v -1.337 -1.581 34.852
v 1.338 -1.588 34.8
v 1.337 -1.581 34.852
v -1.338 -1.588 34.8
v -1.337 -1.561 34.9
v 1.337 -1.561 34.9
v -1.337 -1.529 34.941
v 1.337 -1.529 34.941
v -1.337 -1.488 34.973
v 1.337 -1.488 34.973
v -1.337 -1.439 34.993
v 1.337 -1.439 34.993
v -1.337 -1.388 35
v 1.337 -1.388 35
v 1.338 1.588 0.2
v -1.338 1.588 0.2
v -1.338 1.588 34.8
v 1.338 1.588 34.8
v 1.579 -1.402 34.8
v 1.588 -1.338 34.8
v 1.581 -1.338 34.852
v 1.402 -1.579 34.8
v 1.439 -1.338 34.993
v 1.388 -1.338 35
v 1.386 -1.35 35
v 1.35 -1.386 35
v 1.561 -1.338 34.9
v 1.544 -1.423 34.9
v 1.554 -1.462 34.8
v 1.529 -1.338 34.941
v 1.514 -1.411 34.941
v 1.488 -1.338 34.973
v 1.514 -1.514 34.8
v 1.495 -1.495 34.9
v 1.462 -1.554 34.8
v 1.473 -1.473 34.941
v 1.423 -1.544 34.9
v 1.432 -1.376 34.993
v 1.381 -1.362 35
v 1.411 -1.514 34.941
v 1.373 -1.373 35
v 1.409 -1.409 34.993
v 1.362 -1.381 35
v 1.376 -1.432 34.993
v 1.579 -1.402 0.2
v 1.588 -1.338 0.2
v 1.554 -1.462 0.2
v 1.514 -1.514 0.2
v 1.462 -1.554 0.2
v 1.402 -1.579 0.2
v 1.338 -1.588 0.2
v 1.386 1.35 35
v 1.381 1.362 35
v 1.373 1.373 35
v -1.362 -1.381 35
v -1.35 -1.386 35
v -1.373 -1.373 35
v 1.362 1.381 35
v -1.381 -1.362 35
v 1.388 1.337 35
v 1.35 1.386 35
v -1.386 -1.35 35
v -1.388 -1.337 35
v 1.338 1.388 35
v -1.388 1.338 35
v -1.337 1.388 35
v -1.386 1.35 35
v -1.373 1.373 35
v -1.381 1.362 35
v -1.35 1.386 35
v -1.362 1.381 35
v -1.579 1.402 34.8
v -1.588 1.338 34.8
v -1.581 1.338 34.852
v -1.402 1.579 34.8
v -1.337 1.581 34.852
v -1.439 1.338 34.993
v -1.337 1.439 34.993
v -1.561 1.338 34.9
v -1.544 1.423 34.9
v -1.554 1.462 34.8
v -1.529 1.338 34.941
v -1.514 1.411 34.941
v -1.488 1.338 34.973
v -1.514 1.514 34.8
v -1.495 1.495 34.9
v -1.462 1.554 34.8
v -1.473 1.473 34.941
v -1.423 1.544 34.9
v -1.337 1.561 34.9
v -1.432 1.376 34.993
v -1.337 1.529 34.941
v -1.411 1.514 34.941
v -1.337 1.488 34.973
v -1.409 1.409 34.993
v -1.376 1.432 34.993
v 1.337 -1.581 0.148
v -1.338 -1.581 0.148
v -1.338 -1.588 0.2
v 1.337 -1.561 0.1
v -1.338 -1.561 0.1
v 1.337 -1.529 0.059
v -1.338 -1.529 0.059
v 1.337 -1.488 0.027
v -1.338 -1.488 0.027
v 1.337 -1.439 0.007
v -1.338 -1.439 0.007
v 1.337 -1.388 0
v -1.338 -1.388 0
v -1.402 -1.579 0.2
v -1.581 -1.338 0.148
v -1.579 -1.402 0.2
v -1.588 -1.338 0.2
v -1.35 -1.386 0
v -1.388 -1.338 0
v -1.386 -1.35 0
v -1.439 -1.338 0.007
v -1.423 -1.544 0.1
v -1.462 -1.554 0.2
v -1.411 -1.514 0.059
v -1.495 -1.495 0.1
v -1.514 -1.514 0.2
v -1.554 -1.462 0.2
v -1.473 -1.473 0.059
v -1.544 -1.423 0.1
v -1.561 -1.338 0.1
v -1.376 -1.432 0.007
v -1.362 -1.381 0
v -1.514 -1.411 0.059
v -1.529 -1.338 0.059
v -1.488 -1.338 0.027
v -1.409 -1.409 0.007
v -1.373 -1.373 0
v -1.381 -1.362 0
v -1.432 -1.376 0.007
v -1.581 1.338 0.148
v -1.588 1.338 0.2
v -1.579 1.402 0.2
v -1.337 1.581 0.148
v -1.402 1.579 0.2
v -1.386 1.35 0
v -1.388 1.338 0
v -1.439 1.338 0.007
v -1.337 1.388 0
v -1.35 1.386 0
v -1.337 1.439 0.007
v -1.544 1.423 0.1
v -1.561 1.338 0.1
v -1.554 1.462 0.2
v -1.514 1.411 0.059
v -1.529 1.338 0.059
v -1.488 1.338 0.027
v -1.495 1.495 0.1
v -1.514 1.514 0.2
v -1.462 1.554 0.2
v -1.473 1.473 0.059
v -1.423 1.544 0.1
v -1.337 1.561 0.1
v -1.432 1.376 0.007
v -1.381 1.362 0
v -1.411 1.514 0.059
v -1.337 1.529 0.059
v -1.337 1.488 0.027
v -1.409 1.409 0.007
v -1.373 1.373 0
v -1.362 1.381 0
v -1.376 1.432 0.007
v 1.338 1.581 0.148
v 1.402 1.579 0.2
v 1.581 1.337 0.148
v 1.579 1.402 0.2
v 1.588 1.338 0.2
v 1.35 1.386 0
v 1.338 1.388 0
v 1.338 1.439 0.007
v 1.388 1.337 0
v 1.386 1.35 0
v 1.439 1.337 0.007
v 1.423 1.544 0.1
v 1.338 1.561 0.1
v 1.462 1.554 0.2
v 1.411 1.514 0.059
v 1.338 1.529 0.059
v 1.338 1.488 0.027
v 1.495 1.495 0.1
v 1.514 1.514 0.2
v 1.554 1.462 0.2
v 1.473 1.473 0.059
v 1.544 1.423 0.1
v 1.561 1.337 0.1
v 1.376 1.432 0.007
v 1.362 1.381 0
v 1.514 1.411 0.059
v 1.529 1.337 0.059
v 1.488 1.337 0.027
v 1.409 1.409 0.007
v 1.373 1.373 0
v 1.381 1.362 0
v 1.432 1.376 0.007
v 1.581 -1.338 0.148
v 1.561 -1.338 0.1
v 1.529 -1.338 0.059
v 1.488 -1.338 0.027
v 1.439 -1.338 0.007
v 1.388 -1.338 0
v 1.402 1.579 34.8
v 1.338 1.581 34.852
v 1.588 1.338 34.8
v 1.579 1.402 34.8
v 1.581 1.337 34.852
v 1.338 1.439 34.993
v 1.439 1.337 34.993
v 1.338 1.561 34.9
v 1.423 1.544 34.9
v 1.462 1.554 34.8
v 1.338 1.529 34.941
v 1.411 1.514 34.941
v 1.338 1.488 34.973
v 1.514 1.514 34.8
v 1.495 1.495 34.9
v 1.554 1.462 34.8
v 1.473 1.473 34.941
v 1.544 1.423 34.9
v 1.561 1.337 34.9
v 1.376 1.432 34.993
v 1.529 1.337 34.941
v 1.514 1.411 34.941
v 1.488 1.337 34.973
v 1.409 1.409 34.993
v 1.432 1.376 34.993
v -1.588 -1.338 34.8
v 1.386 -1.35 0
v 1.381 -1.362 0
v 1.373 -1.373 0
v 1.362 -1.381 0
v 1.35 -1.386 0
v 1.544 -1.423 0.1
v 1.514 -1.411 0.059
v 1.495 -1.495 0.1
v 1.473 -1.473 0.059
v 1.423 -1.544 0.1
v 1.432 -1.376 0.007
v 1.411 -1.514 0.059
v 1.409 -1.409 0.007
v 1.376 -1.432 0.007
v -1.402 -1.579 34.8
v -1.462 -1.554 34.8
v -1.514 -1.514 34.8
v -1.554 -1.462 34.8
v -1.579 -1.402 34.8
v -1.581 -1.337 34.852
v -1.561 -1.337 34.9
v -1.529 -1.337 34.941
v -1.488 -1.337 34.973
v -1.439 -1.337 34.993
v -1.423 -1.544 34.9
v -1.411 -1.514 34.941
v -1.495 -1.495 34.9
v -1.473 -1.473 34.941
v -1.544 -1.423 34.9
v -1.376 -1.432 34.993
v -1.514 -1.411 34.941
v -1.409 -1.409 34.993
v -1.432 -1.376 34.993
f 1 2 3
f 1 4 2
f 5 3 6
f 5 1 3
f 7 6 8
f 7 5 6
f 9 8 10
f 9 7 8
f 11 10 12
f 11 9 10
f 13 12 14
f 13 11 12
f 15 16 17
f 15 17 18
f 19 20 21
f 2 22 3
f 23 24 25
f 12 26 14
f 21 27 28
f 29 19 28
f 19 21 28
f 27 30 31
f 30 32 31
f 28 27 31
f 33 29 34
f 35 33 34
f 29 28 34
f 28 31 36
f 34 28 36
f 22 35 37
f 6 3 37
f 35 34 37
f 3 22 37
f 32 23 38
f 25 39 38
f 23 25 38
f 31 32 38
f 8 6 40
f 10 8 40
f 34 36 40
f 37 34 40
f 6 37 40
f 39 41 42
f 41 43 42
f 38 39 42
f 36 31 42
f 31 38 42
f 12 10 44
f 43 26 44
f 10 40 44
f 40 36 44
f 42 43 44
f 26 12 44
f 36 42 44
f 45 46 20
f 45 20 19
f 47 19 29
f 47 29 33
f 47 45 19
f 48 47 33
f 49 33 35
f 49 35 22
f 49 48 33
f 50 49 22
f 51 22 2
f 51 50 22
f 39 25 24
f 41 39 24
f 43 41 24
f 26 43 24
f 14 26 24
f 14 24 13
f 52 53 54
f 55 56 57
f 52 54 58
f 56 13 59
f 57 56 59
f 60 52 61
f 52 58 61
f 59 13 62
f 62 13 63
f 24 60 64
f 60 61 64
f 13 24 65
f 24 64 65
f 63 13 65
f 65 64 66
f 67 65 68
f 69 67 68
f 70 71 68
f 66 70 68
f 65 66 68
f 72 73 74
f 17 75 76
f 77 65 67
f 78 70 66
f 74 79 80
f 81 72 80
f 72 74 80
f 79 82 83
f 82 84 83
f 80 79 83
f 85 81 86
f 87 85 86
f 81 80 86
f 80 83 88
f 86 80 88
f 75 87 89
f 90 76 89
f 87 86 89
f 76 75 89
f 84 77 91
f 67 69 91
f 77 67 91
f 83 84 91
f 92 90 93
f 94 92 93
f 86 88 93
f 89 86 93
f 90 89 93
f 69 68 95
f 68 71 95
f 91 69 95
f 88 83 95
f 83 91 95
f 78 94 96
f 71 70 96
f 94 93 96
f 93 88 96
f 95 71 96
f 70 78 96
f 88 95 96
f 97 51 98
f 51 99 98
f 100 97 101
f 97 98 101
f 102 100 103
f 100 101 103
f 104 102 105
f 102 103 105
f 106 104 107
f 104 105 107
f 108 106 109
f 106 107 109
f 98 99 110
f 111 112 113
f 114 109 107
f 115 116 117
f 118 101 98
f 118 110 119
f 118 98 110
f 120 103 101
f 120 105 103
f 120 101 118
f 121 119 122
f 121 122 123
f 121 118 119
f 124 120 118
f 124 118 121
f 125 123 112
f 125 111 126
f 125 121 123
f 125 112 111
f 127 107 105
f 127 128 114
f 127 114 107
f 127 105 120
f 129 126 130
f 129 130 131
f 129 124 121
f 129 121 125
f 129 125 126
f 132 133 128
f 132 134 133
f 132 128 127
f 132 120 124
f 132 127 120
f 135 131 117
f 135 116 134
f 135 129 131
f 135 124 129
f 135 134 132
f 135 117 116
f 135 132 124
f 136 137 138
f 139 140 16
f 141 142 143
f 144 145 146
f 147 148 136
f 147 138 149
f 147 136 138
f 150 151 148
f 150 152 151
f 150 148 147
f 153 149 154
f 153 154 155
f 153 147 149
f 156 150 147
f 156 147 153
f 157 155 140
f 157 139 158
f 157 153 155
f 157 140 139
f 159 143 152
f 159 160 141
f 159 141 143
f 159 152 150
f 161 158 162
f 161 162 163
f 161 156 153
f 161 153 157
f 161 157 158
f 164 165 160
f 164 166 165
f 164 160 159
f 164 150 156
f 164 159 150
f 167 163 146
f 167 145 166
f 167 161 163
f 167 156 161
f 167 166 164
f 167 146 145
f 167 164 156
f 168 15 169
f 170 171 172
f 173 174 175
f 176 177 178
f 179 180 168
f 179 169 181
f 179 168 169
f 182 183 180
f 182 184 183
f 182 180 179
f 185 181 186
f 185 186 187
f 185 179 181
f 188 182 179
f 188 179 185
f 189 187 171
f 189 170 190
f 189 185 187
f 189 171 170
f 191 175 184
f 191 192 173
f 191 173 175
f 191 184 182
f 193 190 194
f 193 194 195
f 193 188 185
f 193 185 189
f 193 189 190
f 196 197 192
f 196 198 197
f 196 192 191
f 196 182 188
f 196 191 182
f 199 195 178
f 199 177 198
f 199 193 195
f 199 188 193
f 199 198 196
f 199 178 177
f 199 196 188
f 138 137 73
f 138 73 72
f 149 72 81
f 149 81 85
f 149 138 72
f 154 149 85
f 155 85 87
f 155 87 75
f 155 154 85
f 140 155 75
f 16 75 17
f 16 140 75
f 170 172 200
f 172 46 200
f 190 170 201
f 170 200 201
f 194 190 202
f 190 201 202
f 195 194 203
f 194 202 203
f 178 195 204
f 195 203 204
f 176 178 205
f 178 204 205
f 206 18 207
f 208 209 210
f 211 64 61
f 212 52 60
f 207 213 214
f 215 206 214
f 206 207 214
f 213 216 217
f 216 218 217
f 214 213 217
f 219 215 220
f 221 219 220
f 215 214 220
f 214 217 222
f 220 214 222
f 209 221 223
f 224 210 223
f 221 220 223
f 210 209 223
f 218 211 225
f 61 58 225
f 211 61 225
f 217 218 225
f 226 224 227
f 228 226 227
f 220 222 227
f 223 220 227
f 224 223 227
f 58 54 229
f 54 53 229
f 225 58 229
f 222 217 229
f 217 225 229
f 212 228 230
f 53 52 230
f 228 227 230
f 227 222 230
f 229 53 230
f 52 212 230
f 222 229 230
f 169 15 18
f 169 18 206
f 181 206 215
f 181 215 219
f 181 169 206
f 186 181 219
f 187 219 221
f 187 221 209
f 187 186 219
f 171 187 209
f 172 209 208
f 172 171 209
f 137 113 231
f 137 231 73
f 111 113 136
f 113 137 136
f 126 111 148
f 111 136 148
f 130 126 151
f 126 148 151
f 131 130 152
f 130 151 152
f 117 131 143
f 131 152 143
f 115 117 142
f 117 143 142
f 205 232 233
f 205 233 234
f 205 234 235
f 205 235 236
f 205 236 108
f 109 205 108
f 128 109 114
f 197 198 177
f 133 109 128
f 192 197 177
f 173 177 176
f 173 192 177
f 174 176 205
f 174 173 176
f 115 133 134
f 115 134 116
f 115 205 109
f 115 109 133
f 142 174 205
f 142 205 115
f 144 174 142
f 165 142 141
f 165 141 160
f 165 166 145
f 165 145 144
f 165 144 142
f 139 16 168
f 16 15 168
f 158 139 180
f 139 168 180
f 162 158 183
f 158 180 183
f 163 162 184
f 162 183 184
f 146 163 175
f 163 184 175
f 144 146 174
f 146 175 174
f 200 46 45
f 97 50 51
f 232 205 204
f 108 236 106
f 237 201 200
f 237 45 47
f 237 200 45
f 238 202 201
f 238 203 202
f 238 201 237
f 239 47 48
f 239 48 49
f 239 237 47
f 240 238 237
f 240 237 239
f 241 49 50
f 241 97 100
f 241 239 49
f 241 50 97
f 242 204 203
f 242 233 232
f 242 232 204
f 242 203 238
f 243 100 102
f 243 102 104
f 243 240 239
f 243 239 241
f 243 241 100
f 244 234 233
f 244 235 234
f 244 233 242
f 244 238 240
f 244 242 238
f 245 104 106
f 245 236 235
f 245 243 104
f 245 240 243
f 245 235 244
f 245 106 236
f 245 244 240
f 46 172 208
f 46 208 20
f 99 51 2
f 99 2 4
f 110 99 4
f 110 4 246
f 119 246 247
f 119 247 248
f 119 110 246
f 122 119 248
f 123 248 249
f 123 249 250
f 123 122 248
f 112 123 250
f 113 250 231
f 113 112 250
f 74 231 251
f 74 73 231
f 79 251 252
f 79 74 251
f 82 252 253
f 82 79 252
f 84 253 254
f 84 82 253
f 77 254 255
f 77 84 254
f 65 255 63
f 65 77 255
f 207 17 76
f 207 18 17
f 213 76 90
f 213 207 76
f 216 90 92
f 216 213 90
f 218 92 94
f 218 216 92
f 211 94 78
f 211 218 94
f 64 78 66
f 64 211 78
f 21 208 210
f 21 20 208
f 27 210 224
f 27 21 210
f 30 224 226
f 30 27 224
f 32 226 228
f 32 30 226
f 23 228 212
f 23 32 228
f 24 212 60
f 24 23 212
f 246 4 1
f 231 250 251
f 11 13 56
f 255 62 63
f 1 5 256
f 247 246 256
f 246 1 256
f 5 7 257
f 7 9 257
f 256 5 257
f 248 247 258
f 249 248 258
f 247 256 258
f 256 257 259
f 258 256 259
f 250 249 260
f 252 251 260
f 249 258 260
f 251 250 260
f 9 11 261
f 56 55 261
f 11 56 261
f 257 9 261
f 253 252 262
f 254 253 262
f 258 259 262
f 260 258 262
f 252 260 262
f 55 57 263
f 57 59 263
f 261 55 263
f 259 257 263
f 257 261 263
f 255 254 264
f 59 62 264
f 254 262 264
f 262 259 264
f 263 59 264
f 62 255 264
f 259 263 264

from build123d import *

# Parameters (mm, degrees)
BOSS_EXTRUDE1_DEPTH = 35
FILLET1_R           = 0.2


with BuildPart() as part:
    # Sketch1 → Boss-Extrude1 (new body)
    with BuildSketch(Plane.XY):
        with BuildLine():
            Line((-1.3375, 1.5875), (1.3375, 1.5875))
            ThreePointArc((1.3375, 1.5875), (1.514276695, 1.514276695), (1.5875, 1.3375))
            Line((1.5875, 1.3375), (1.5875, -1.3375))
            ThreePointArc((1.5875, -1.3375), (1.514276695, -1.514276695), (1.3375, -1.5875))
            Line((1.3375, -1.5875), (-1.3375, -1.5875))
            ThreePointArc((-1.3375, -1.5875), (-1.514276695, -1.514276695), (-1.5875, -1.3375))
            Line((-1.5875, -1.3375), (-1.5875, 1.3375))
            ThreePointArc((-1.5875, 1.3375), (-1.514276695, 1.514276695), (-1.3375, 1.5875))
        make_face()
    extrude(amount=BOSS_EXTRUDE1_DEPTH)

    # Fillet1
    fillet1_edges = [part.edges().sort_by_distance(p)[0] for p in [
        (-1.514276695, -1.514276695, 35),
        (-1.5875, 0, 0),
        (-1.514276695, 1.514276695, 0),
        (0, -1.5875, 35),
        (1.514276695, -1.514276695, 35),
        (1.5875, 0, 35),
        (1.514276695, 1.514276695, 35),
        (0, 1.5875, 35),
        (-1.514276695, 1.514276695, 35),
        (-1.5875, 0, 35),
        (0, 1.5875, 0),
        (1.514276695, 1.514276695, 0),
        (1.5875, 0, 0),
        (1.514276695, -1.514276695, 0),
        (0, -1.5875, 0),
        (-1.514276695, -1.514276695, 0),
    ]]
    fillet(fillet1_edges, radius=FILLET1_R)


solid = part.part
